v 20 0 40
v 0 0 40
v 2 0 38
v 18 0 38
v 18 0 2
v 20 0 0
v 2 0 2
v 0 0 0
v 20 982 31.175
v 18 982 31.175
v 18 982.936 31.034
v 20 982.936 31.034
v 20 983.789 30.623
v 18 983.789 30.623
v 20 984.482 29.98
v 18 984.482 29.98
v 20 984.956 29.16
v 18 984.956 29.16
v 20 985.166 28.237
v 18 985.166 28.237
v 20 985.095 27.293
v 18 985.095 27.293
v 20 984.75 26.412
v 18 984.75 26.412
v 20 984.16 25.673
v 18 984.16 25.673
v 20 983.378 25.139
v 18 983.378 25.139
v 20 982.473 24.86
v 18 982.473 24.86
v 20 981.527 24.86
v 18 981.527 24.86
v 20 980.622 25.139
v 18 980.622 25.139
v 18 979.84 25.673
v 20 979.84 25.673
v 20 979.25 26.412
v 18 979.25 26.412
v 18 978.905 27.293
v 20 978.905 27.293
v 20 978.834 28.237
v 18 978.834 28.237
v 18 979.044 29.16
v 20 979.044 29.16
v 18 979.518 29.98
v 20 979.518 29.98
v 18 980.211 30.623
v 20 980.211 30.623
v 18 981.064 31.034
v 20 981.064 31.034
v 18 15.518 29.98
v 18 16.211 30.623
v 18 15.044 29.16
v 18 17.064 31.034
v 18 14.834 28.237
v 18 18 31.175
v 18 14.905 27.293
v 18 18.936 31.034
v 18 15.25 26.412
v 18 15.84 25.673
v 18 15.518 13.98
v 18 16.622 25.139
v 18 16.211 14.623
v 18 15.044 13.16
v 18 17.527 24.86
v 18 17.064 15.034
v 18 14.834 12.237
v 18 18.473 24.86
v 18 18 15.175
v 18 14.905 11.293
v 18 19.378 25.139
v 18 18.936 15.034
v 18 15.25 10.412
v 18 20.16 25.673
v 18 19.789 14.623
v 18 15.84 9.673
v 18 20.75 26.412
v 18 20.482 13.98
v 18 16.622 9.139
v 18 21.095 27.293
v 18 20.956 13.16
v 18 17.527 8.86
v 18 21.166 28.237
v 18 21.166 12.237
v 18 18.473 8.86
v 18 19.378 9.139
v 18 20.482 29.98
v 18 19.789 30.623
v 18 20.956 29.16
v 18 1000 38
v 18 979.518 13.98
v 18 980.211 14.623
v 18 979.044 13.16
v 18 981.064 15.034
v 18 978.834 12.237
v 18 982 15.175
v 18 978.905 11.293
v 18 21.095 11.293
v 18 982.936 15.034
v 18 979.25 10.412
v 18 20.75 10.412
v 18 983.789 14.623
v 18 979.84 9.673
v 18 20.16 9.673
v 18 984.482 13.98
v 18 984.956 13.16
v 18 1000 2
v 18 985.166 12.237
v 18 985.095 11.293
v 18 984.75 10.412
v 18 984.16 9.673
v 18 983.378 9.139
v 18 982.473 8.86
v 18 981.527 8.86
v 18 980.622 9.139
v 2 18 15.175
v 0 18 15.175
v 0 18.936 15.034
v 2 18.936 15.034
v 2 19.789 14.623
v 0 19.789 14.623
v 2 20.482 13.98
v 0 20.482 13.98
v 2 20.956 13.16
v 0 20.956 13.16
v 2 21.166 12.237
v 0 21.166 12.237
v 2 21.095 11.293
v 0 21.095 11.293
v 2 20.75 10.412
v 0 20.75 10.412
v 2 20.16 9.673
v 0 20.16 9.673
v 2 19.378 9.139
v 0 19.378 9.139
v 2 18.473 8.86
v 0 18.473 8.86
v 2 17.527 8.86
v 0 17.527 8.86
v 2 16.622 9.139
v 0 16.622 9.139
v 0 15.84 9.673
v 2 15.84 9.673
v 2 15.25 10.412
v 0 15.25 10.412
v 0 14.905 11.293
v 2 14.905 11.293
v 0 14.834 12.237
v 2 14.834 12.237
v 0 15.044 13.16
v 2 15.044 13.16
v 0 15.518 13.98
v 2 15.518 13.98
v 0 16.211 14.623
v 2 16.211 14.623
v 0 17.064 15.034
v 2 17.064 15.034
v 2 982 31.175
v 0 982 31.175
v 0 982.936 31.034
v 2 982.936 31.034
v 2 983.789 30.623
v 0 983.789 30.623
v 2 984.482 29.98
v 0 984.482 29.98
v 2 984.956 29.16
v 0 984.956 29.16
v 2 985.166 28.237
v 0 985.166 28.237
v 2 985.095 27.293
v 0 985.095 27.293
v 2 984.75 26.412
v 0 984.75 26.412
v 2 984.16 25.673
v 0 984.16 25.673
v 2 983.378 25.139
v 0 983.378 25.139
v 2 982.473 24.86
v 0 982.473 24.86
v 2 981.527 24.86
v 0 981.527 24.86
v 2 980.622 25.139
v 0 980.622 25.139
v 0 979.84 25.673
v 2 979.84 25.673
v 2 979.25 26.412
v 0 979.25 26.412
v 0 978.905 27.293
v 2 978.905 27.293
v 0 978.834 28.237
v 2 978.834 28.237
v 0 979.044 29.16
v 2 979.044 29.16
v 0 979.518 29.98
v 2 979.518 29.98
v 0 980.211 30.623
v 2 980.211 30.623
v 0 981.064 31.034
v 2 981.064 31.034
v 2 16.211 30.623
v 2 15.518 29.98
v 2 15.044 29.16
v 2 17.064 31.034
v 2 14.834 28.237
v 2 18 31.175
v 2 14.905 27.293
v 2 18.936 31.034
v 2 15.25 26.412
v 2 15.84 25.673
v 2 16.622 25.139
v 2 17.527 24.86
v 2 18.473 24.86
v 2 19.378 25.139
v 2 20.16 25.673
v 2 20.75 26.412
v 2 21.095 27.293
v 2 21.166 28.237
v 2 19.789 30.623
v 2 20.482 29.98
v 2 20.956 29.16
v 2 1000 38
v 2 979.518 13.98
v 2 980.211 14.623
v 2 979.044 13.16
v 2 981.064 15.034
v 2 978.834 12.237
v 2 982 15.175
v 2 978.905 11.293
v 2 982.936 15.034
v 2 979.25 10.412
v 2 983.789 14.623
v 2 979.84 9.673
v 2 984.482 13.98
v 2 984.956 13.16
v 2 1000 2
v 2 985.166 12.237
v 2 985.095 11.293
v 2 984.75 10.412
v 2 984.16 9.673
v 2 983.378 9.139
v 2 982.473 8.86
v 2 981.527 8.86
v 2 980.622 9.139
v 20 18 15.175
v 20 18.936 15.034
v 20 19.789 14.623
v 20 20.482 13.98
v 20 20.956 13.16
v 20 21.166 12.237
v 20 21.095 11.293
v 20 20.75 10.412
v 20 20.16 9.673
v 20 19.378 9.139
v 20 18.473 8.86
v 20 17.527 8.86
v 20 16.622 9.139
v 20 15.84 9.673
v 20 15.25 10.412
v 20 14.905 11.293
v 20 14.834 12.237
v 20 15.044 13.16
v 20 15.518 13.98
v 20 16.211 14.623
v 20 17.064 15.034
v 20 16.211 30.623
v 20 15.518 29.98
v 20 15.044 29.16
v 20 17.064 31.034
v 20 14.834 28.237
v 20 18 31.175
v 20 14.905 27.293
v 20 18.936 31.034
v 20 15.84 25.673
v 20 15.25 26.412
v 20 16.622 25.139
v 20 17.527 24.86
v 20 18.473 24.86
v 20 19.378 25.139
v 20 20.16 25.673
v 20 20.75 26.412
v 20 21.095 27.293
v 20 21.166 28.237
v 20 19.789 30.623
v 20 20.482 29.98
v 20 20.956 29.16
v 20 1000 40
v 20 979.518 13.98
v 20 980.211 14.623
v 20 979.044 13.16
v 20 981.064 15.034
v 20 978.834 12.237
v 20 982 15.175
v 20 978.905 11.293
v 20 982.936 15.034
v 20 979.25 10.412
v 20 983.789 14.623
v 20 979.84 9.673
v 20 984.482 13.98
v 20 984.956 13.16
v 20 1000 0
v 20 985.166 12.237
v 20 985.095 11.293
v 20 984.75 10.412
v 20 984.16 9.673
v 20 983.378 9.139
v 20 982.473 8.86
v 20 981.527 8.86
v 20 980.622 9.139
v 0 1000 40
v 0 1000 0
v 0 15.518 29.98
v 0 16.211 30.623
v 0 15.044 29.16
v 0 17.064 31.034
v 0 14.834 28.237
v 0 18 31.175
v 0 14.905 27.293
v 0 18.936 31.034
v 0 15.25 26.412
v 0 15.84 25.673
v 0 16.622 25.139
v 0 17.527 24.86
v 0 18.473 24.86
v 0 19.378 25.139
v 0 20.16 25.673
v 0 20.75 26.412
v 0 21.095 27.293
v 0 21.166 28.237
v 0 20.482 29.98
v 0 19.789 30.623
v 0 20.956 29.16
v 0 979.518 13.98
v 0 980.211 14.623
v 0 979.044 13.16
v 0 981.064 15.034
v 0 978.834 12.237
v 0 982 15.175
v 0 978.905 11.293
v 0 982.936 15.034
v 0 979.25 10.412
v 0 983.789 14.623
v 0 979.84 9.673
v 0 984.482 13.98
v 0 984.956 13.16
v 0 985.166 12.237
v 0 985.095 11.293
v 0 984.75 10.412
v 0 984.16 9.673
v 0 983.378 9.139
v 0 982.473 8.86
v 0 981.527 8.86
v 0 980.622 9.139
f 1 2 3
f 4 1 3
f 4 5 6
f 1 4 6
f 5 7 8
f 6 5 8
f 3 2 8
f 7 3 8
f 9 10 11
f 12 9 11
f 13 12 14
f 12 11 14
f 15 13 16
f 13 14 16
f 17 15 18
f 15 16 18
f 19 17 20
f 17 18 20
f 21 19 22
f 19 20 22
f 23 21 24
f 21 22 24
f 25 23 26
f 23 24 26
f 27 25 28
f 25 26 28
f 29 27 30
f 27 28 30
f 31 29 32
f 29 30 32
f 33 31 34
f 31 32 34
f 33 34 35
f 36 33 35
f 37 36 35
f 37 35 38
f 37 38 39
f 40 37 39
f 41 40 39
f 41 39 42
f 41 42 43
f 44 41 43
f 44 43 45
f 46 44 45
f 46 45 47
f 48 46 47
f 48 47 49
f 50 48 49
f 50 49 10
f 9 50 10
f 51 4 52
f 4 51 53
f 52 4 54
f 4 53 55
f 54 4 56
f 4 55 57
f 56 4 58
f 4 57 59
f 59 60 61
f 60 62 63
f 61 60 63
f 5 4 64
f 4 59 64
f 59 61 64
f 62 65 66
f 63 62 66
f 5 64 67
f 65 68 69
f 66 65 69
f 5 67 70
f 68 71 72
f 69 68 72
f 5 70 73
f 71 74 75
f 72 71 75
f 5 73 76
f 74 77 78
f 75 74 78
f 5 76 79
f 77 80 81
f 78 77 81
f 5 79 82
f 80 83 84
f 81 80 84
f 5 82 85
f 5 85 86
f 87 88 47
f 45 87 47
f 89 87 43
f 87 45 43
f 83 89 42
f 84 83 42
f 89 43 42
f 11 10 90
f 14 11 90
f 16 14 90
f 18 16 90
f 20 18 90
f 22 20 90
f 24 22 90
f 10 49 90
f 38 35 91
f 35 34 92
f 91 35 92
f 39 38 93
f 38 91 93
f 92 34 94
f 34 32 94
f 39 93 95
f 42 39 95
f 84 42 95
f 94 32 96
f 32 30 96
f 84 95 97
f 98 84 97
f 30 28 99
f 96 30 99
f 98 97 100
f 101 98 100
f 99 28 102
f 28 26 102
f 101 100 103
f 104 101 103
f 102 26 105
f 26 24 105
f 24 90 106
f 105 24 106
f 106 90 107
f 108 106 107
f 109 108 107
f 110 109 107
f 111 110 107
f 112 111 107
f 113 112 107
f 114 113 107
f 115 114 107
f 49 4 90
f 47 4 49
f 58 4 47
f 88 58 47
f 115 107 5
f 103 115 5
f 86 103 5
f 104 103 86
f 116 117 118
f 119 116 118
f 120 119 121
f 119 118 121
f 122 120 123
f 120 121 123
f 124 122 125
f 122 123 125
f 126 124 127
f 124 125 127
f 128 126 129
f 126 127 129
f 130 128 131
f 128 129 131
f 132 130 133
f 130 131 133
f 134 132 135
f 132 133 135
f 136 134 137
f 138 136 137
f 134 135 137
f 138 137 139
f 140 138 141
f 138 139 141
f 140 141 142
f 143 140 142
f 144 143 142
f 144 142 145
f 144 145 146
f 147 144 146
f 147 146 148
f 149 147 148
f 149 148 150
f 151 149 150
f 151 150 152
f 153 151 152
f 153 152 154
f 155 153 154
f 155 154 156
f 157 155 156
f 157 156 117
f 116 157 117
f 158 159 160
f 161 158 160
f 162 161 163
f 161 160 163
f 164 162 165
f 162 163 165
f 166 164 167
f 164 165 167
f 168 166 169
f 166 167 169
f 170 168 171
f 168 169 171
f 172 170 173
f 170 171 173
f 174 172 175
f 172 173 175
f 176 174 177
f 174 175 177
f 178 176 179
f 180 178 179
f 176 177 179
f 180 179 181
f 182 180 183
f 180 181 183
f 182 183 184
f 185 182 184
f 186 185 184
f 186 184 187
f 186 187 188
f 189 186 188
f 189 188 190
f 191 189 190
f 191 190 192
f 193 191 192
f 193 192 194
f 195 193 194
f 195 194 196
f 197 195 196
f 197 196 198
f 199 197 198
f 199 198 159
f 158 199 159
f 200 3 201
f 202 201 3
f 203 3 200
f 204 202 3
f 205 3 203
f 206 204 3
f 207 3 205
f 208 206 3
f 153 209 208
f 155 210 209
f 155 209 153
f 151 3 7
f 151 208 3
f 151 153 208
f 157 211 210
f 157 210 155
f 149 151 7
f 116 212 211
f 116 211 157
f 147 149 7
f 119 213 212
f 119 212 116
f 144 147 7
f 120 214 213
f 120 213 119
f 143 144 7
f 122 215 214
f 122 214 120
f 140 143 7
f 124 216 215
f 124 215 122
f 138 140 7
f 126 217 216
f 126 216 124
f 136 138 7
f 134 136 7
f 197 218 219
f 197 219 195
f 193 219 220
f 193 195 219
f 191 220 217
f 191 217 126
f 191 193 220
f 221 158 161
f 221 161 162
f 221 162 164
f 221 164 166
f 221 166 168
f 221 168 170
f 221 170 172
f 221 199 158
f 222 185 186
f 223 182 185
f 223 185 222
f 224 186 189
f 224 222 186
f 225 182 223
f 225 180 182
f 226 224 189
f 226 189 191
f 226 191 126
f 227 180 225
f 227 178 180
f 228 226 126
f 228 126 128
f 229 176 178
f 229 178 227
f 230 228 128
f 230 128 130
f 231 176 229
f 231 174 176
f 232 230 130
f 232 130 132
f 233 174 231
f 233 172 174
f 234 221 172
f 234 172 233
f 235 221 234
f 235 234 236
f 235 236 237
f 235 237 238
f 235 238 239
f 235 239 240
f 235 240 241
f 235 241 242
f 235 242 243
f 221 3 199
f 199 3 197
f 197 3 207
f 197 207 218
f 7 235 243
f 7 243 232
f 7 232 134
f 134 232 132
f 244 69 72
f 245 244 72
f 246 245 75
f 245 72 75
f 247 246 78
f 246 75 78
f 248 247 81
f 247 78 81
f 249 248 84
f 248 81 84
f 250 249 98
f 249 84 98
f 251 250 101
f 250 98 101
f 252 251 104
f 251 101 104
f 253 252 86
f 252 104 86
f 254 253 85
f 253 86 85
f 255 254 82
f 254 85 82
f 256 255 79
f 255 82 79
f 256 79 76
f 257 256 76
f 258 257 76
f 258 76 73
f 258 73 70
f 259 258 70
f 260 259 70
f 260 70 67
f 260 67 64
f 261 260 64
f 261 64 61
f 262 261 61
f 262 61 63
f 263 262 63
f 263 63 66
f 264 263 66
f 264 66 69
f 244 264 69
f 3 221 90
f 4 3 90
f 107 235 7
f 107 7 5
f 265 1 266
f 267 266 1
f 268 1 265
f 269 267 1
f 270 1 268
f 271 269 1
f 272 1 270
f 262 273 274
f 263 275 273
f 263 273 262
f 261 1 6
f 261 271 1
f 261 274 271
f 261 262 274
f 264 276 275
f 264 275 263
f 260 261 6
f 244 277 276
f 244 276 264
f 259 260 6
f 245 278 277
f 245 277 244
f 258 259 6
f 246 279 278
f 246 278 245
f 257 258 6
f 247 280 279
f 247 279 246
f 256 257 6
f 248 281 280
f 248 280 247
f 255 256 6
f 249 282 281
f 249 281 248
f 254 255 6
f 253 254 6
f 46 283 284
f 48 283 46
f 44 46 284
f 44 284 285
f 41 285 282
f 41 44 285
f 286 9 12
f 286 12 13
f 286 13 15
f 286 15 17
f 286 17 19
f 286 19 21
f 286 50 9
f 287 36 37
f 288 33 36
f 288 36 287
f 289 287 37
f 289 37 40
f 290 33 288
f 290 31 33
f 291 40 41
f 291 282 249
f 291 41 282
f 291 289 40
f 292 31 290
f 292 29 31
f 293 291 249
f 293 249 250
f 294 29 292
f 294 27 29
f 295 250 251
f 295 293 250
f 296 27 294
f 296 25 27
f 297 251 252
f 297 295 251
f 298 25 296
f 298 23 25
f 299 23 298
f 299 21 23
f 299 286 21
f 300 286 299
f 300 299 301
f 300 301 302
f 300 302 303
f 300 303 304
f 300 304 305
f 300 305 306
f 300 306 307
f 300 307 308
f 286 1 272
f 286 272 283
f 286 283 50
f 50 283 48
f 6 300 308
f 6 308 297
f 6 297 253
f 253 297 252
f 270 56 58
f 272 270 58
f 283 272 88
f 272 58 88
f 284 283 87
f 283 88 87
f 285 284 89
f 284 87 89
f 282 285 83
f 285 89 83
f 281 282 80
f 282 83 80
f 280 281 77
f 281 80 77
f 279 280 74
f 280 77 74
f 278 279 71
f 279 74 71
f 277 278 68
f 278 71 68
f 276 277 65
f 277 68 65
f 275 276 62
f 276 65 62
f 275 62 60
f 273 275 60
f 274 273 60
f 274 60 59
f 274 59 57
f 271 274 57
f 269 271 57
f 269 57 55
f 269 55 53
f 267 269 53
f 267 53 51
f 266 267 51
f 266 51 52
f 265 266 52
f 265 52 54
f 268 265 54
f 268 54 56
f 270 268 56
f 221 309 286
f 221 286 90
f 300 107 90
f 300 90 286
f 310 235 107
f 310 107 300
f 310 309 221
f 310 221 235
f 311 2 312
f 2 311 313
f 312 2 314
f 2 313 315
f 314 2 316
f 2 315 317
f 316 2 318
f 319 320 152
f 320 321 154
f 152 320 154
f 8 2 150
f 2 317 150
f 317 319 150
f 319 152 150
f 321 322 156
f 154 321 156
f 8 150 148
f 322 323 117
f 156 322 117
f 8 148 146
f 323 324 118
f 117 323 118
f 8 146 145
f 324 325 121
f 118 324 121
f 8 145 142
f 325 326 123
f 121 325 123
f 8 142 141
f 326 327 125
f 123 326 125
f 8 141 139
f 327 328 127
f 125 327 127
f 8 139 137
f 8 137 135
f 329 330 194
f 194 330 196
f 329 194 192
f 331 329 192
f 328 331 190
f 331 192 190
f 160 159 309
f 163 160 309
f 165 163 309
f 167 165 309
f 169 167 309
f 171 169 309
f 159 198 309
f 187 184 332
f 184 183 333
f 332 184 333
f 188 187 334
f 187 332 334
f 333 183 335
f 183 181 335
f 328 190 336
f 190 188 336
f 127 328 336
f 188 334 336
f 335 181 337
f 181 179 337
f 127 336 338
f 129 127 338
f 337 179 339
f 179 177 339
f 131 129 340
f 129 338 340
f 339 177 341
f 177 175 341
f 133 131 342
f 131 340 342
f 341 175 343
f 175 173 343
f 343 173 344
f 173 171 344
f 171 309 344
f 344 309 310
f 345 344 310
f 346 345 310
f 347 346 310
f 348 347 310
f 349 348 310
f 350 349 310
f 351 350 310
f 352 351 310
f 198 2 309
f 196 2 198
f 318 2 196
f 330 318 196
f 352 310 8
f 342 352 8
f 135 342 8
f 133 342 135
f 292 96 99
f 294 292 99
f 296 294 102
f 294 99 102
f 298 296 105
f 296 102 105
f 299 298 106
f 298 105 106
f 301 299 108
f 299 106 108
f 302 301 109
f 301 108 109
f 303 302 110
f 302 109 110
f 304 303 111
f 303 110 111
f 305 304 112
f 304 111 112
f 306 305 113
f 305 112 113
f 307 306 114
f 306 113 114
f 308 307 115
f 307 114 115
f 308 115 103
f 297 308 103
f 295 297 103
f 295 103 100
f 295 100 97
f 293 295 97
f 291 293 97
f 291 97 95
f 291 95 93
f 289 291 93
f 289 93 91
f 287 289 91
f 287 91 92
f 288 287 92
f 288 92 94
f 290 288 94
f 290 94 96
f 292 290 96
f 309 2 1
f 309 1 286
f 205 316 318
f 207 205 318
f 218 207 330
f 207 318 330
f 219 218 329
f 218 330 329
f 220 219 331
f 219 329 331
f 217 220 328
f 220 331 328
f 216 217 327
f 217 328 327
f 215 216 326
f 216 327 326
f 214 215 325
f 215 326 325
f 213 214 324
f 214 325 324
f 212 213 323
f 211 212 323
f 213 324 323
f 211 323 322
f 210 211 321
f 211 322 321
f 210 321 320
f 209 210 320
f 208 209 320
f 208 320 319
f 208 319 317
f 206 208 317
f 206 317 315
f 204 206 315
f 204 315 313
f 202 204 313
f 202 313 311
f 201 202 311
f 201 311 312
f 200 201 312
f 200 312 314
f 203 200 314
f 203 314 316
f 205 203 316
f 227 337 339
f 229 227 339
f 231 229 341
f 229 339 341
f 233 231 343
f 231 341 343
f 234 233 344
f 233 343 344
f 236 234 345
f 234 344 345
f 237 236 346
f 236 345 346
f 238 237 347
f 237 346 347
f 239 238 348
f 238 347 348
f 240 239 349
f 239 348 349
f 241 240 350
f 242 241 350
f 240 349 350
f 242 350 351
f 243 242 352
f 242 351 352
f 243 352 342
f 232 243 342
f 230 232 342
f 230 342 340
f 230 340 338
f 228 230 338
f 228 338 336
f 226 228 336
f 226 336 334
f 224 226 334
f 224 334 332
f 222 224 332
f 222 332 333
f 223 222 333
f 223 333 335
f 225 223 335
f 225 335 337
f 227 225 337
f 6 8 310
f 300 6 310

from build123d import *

# Parameters (mm, degrees)
CROQUIS1_W              = 40
CROQUIS1_H              = 1000
SALIENTE_EXTRUIR1_DEPTH = 20
CROQUIS2_W              = 16
CROQUIS2_H              = 36
CORTAR_EXTRUIR1_DEPTH   = 1000
CROQUIS3_R              = 3.175
CORTAR_EXTRUIR2_DEPTH   = 1000


with BuildPart() as part:
    # Croquis1 → Saliente-Extruir1 (new body)
    with BuildSketch(Plane(origin=(0, 0, 0), x_dir=(0, 0, -1), z_dir=(1, 0, 0))):
        with Locations((-20, 500)):
            Rectangle(CROQUIS1_W, CROQUIS1_H)
    extrude(amount=SALIENTE_EXTRUIR1_DEPTH)

    # Croquis2 → Cortar-Extruir1 (cut)
    with BuildSketch(Plane(origin=(0, 1000, 0), x_dir=(1, 0, 0), z_dir=(0, 1, 0))):
        with Locations((10, -20)):
            Rectangle(CROQUIS2_W, CROQUIS2_H)
    extrude(amount=-CORTAR_EXTRUIR1_DEPTH, mode=Mode.SUBTRACT)

    # Croquis3 → Cortar-Extruir2 (cut)
    with BuildSketch(Plane.ZY):
        with Locations((12, 982)):
            Circle(CROQUIS3_R)
        with Locations((28, 982)):
            Circle(CROQUIS3_R)
        with Locations((28, 18)):
            Circle(CROQUIS3_R)
        with Locations((12, 18)):
            Circle(CROQUIS3_R)
    extrude(amount=-CORTAR_EXTRUIR2_DEPTH, mode=Mode.SUBTRACT)


solid = part.part
